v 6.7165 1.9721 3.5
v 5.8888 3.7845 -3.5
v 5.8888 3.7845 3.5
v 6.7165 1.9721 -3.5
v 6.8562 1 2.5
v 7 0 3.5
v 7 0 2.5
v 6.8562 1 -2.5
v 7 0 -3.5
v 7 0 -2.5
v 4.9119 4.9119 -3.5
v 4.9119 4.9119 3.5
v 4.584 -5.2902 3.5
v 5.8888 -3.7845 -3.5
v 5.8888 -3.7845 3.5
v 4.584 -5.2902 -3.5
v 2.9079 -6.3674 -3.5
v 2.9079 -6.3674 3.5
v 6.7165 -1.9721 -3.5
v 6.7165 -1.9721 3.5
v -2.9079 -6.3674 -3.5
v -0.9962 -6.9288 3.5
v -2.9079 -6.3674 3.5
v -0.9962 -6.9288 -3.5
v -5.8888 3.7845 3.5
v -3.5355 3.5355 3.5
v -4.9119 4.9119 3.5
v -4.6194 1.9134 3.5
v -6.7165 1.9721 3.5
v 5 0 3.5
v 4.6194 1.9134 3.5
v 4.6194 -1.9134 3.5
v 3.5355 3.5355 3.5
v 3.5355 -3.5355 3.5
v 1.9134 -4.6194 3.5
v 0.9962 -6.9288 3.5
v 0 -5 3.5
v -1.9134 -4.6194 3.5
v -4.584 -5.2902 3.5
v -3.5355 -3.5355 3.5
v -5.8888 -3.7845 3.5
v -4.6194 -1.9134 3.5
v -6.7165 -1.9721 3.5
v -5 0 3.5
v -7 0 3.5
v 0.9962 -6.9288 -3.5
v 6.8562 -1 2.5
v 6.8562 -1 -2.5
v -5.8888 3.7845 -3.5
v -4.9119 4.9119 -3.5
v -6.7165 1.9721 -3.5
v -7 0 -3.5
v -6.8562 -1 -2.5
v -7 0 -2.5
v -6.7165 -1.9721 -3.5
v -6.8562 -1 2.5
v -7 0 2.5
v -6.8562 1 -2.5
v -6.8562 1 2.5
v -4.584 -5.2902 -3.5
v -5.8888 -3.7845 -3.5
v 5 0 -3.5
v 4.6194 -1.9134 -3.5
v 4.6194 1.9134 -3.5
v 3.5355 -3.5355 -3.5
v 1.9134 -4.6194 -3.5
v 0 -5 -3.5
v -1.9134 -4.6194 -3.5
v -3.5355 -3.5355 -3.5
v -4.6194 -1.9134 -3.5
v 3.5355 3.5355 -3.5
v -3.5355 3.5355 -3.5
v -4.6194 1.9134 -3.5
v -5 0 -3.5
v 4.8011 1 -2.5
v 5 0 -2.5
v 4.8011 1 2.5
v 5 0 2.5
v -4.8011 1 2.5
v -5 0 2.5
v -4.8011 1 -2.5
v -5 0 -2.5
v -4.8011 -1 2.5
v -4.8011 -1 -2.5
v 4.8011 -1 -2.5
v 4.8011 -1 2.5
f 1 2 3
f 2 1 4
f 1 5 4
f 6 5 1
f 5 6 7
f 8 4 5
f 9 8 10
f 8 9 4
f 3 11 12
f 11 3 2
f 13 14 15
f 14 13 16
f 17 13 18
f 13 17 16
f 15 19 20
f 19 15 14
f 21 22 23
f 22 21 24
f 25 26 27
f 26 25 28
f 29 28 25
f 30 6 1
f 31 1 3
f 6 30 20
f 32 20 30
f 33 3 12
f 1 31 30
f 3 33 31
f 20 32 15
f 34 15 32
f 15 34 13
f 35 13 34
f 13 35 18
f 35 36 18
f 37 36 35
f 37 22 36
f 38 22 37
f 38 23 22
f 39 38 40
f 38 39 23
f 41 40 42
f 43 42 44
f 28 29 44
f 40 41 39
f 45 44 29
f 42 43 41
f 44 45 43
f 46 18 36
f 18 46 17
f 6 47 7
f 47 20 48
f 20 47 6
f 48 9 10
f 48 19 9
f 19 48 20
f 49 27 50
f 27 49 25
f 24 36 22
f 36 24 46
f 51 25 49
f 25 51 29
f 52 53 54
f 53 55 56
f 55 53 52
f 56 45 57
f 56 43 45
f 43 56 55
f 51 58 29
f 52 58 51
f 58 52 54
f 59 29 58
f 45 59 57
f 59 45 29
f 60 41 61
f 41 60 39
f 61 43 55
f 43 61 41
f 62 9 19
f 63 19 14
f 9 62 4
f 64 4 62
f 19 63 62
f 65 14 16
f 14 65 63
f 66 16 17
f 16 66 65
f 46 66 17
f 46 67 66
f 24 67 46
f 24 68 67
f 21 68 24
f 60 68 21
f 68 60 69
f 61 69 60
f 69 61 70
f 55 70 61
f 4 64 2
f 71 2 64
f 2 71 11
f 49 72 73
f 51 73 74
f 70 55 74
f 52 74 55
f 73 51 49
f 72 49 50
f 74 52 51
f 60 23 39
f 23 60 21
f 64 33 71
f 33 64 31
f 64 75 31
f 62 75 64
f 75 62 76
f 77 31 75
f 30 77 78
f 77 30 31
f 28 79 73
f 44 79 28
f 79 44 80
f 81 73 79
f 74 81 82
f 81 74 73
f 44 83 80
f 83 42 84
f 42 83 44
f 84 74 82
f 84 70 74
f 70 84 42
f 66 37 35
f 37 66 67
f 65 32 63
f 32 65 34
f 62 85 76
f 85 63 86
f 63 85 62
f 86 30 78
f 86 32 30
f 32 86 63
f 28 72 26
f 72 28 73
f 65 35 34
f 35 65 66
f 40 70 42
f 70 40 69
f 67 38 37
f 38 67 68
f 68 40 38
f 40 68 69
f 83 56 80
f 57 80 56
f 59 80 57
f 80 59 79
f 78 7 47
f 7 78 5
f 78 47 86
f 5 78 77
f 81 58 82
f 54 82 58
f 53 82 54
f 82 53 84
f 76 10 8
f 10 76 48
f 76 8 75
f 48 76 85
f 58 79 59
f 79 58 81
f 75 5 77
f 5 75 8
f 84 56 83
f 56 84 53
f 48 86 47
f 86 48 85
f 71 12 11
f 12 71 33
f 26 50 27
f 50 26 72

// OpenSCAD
innerradius = 5; // [0:100]
wallthickness = 2; // [0:10]
radius = innerradius+wallthickness;

height = 7; // [0:15]

cable_binder_width_plus_margin = 5; // [0:10]
cable_binder_height_plus_margin = 2; // [0:10]
cable_binder_position_in_percent = 50; // [0:100]

open_top = "yes"; // [yes,no]
opening_angle = 90; // // [0:360]



// from http://rocklinux.net/pipermail/openscad/2012-August/003170.html
// whosawhatsis
module slice(r = 10, deg = 30) { 
	degn = (deg % 360 > 0) ? deg % 360 : deg % 360 + 360;
	difference() {
		circle(r);
		if (degn > 180) 
			intersection_for(a = [0, 180 - degn]) 
				rotate(a) 
					translate([-r, 0, 0]) 
						square(r * 2); 
		else 
			union() 
				for(a = [0, 180 - degn]) 
					rotate(a) 
						translate([-r, 0, 0]) 
							square(r * 2); 
	}
}



difference(){
	cylinder(h = height, r = radius, center = true);
	cylinder(h = height+2, r = innerradius, center = true);

	translate([0,-radius,0])
		translate([0,(radius*2)*cable_binder_position_in_percent/100, 0])
			cube(size = [radius*2, cable_binder_height_plus_margin, cable_binder_width_plus_margin], center = true);

if (open_top == "yes"){
	rotate(90 + opening_angle/2) 
	linear_extrude(height = height+2, center = true)
		slice(radius*2, opening_angle);
}

}
